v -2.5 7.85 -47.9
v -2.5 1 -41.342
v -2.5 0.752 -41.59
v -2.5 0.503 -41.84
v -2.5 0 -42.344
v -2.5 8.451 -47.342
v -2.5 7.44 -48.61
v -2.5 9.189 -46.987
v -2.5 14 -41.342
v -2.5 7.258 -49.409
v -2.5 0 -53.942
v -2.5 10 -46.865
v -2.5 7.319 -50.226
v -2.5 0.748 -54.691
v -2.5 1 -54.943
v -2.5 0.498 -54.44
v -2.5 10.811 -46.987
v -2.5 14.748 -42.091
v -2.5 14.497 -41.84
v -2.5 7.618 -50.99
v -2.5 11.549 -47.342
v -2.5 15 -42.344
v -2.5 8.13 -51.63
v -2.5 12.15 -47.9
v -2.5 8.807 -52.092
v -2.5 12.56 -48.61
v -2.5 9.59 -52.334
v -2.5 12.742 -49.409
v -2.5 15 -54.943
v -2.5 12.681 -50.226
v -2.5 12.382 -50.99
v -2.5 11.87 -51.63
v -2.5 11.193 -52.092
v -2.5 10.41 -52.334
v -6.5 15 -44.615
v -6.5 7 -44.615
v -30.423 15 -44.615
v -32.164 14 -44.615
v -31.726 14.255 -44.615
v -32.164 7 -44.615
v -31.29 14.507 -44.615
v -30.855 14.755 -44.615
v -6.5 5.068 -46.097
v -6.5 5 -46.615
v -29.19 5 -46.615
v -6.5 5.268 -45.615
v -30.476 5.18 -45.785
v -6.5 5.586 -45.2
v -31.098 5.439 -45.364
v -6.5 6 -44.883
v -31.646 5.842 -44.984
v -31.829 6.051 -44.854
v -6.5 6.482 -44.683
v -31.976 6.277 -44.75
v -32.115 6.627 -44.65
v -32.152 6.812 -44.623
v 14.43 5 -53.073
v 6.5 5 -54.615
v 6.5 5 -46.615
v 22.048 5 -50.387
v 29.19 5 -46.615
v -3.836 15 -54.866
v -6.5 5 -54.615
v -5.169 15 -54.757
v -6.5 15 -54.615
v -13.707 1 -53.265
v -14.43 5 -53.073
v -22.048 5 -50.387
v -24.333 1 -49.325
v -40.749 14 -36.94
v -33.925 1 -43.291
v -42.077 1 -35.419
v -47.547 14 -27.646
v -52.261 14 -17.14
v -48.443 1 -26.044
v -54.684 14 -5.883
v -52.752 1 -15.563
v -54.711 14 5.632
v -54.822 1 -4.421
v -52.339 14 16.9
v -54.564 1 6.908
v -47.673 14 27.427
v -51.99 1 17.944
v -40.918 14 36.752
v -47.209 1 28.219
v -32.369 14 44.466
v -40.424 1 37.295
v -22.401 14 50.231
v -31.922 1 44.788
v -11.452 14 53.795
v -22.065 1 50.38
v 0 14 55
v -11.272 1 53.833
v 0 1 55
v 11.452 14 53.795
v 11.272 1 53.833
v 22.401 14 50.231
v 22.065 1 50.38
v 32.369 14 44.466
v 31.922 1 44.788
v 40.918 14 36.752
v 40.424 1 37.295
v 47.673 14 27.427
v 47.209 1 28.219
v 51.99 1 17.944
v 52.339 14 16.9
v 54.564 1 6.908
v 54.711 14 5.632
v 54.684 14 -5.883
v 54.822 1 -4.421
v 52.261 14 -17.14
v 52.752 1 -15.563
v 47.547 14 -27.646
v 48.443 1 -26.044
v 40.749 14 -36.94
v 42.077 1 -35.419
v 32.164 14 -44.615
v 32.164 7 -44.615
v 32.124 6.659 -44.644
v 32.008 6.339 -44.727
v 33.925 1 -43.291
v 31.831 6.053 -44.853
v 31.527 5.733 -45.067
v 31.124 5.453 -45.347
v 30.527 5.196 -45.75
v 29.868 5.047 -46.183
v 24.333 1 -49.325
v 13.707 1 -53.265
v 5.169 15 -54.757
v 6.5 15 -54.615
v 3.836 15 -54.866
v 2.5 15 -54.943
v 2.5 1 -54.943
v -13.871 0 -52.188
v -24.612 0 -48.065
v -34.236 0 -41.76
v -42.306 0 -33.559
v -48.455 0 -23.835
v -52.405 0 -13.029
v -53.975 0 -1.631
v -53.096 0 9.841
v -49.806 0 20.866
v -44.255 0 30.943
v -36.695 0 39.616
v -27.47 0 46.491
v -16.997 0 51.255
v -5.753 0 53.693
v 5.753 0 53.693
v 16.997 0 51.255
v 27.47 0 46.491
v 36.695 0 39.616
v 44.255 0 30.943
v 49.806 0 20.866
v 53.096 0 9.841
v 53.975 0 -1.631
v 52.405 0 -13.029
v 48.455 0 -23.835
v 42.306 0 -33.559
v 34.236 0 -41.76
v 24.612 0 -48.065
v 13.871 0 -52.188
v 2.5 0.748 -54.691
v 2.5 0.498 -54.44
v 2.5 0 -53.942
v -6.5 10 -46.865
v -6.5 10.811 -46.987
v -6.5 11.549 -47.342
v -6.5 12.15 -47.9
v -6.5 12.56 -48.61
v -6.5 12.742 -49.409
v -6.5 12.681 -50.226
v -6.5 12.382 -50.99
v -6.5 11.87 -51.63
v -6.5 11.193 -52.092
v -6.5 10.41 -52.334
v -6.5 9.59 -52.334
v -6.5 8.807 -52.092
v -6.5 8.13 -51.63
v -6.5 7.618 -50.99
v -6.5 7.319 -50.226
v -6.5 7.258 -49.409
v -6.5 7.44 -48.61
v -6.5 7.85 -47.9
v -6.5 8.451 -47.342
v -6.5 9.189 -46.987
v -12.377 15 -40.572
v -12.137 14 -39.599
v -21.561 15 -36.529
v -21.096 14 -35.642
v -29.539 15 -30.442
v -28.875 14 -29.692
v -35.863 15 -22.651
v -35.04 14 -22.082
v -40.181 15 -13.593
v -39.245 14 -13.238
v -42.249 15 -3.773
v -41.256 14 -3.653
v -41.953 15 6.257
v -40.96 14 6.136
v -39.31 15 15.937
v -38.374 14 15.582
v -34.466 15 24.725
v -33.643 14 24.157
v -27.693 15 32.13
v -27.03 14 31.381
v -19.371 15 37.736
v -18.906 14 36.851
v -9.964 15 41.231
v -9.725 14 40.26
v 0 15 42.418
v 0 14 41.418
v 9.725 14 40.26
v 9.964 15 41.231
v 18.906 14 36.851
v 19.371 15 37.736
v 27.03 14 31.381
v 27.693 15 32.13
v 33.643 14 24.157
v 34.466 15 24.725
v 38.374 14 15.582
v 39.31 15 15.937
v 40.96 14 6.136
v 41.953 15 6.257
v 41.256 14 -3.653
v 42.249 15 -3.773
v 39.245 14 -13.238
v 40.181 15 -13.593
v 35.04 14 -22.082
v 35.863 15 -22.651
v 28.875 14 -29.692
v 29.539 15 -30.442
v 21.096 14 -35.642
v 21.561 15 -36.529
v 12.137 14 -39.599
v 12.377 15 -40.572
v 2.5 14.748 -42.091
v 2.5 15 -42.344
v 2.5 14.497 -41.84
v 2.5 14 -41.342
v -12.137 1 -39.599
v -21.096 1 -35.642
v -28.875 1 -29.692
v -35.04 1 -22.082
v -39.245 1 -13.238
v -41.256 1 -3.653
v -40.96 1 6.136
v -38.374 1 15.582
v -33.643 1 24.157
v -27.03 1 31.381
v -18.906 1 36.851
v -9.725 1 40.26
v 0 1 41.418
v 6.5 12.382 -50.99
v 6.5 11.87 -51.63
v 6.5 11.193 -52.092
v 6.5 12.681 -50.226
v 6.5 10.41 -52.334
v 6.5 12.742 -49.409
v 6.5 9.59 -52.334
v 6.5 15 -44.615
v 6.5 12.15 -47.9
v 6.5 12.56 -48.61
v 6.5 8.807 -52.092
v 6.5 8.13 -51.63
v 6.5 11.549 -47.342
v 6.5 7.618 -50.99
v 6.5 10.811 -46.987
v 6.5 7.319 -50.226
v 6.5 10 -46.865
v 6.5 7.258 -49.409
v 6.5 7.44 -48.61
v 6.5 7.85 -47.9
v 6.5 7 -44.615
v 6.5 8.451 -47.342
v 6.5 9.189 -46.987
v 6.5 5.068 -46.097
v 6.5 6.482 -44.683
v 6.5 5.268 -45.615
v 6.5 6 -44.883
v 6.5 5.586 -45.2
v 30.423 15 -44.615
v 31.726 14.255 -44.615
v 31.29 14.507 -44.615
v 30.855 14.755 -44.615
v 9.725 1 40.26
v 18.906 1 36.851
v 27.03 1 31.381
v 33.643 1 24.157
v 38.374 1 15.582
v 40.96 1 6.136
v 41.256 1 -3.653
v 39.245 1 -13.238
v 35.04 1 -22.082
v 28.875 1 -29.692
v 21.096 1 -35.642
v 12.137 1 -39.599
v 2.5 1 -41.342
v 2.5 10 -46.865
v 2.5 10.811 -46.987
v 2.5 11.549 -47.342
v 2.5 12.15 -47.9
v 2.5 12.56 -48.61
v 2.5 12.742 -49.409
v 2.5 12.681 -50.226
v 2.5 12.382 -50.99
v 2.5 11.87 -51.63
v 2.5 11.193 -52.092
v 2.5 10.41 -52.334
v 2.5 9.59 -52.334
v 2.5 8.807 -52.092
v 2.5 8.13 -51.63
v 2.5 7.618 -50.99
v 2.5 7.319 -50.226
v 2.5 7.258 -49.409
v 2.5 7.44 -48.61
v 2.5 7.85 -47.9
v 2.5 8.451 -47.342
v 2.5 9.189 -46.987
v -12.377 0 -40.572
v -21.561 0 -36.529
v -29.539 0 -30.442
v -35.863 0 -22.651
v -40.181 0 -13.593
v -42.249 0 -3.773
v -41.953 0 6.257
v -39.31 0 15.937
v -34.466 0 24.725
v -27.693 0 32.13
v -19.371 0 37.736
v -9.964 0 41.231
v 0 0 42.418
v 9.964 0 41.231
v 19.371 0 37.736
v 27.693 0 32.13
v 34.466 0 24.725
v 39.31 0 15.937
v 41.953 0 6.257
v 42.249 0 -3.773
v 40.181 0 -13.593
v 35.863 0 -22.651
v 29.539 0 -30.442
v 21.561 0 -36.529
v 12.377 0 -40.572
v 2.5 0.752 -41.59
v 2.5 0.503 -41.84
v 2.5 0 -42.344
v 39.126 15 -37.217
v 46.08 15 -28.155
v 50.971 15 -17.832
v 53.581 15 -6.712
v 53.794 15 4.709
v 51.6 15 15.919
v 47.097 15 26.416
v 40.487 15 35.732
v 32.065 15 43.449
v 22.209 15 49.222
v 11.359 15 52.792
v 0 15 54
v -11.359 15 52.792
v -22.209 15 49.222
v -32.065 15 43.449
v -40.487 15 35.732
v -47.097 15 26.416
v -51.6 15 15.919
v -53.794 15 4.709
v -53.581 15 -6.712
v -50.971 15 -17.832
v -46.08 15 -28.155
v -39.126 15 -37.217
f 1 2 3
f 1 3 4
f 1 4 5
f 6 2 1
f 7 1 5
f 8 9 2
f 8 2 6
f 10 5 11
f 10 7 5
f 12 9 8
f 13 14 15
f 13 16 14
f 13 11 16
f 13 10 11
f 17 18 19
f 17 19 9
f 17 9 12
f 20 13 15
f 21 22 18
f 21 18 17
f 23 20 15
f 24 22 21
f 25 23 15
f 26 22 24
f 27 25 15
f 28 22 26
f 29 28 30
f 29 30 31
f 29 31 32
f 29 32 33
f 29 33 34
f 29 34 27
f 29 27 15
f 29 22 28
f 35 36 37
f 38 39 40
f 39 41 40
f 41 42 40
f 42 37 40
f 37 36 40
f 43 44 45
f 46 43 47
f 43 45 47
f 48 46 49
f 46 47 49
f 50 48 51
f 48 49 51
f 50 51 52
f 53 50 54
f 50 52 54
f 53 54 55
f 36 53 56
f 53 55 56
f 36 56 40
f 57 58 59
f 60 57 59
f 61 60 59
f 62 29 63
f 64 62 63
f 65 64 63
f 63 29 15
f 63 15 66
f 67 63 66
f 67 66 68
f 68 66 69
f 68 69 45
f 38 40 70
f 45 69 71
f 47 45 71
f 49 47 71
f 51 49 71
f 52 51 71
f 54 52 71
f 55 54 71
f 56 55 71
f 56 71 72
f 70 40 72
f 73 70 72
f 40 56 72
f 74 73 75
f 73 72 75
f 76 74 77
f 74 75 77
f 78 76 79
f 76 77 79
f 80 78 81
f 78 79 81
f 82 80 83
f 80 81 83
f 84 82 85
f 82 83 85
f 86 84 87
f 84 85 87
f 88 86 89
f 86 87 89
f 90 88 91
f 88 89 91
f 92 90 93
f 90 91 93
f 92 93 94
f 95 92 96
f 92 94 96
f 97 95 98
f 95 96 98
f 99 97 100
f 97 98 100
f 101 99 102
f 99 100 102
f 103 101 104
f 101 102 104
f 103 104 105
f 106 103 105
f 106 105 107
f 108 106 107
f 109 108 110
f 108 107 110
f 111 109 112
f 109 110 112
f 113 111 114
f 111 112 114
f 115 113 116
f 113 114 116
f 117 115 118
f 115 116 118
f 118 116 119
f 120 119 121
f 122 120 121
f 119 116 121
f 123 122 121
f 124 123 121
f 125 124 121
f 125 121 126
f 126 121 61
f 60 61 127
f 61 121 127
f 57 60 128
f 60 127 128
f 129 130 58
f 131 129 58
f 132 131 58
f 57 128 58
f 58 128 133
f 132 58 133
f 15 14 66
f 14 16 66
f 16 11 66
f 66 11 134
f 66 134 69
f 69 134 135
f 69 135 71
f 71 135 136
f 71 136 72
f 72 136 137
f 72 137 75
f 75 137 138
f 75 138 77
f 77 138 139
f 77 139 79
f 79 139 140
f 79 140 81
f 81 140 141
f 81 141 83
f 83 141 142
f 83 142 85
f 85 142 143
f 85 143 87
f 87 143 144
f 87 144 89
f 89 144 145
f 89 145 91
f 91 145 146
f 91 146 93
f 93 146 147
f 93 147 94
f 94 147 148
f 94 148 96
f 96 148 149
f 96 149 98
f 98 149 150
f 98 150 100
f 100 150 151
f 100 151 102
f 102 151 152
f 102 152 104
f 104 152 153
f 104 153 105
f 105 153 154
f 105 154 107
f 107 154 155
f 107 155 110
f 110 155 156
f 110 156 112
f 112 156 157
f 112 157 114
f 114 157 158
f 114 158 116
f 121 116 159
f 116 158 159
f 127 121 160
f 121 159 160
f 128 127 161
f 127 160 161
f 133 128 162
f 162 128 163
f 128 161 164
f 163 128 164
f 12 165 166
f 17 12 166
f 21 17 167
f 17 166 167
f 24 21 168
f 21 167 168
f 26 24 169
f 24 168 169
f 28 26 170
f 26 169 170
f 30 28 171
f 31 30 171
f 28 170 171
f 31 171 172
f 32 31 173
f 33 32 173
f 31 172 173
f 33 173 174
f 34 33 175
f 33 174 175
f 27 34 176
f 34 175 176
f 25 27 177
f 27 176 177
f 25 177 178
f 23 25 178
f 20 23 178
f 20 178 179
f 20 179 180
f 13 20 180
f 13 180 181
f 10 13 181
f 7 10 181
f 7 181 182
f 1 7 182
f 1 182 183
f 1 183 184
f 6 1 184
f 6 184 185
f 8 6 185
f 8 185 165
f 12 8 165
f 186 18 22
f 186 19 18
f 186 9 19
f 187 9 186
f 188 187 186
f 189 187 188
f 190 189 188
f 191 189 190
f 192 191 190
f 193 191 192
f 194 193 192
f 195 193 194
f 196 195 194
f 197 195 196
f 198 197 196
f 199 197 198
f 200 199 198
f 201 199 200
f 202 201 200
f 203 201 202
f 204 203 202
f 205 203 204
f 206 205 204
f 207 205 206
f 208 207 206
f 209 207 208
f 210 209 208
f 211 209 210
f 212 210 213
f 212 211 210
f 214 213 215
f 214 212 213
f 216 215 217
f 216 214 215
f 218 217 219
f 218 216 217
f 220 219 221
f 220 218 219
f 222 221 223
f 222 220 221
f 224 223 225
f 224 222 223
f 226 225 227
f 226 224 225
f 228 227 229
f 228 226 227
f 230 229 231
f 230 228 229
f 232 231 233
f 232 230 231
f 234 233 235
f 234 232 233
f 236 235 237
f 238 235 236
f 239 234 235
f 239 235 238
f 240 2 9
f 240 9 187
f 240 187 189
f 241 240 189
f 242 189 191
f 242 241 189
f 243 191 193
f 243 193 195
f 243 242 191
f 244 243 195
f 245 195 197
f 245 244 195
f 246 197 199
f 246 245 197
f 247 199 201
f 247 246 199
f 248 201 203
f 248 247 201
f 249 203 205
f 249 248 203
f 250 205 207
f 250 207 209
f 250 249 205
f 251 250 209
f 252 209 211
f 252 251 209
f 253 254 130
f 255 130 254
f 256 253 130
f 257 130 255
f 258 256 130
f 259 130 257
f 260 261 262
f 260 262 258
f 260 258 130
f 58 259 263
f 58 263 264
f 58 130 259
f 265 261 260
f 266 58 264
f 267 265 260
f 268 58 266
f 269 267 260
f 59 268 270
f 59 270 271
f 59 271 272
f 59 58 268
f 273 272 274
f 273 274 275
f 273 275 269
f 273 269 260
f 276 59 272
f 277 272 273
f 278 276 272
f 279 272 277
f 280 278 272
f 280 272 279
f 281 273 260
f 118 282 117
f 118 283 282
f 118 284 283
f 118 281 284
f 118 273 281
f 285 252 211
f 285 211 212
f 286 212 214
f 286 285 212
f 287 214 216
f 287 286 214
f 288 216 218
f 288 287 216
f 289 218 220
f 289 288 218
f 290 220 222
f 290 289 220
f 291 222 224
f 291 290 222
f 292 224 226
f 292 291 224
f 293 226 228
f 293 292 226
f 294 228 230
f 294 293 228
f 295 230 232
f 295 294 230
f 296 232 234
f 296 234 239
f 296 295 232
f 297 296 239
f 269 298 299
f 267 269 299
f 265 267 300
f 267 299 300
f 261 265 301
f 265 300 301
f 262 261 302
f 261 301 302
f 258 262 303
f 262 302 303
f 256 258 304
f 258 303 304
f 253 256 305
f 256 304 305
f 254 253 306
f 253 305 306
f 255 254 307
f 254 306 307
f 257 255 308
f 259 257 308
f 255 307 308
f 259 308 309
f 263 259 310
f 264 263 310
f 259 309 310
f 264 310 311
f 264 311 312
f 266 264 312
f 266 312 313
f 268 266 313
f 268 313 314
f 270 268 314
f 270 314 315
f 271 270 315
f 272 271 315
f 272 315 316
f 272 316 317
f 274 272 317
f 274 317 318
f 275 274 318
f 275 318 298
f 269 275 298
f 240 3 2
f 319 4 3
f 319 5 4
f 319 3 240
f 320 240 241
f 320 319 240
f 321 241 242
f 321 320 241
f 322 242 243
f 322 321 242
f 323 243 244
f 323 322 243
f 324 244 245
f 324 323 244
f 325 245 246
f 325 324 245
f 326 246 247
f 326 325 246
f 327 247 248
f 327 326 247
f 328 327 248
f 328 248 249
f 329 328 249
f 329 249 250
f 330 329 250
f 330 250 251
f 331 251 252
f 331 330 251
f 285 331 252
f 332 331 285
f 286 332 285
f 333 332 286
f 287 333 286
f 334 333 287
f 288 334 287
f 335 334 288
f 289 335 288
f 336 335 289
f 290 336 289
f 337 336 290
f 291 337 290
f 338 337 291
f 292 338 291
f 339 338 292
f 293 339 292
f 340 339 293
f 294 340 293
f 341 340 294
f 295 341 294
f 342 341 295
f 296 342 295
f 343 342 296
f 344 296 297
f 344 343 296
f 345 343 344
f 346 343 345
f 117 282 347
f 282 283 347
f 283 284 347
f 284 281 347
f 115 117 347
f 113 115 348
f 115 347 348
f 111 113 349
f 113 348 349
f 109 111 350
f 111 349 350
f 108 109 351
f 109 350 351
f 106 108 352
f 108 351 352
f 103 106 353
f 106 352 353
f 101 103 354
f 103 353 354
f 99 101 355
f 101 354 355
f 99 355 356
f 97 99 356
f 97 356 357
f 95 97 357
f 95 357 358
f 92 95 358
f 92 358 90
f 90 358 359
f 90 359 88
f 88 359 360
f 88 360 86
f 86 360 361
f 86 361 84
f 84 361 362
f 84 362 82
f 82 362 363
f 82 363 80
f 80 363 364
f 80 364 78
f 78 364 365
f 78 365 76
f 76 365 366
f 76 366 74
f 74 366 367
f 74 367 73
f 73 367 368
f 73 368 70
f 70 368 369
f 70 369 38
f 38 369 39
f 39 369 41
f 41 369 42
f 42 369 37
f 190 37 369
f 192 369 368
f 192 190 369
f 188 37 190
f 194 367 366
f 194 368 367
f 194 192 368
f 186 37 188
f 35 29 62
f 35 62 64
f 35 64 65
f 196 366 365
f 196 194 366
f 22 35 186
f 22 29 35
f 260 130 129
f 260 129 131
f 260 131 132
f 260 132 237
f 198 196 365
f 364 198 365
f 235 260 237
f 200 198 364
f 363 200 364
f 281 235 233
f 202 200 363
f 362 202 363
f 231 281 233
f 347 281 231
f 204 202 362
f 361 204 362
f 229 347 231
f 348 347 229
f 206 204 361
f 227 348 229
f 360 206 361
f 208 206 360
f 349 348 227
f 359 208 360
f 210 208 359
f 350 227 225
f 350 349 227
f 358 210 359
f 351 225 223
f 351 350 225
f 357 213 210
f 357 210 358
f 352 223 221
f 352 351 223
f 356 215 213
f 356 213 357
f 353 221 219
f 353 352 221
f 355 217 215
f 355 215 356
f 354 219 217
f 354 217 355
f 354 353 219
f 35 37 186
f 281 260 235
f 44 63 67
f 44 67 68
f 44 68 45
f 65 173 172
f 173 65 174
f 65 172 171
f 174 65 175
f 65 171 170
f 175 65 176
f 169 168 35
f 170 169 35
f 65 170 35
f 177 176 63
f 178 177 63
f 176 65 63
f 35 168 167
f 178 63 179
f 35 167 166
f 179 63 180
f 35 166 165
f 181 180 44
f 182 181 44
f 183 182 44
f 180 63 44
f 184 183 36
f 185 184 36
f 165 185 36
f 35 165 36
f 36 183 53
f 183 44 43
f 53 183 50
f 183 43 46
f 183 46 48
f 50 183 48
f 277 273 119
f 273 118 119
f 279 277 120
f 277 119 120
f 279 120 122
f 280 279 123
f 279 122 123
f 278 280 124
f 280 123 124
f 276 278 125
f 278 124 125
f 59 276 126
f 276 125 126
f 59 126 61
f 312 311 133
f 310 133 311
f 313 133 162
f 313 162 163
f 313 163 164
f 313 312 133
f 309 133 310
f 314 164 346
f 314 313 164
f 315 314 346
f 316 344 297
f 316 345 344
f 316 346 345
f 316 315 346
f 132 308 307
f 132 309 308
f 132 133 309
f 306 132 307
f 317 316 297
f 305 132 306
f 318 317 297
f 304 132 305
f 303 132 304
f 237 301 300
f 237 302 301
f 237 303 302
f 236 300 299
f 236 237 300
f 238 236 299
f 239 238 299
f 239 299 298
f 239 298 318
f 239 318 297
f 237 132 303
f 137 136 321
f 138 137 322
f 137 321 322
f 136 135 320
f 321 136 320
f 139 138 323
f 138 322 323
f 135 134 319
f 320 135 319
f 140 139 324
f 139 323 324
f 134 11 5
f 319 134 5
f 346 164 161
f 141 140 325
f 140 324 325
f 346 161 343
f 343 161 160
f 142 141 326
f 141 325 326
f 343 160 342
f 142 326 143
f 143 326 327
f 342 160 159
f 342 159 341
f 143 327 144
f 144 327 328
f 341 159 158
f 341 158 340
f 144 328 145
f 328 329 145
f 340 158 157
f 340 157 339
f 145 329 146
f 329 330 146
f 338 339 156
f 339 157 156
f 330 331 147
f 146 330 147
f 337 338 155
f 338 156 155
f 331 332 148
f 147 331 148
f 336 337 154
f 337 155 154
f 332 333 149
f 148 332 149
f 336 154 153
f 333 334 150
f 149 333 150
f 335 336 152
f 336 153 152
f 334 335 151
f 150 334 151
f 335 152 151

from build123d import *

# Parameters (mm, degrees)
SKETCH1_R           = 55
SKETCH1_R_2         = 41.4175
BOSS_EXTRUDE1_DEPTH = 15
CUT_EXTRUDE1_DEPTH  = 80.214897589
CUT_EXTRUDE2_START  = -10
CUT_EXTRUDE2_DEPTH  = 10
SKETCH4_R           = 2.75
CUT_EXTRUDE3_DEPTH  = 84.858511792
FILLET2_R           = 2
CHAMFER2_SIZE       = 1
CHAMFER3_SIZE       = 1


with BuildPart() as part:
    # Sketch1 → Boss-Extrude1 (new body)
    with BuildSketch(Plane(origin=(0, 0, 0), x_dir=(1, 0, 0), z_dir=(0, 1, 0))):
        with Locations(Location((0, 0, 0), (0, 0, 270))):
            Circle(SKETCH1_R)
        with Locations(Location((0, 0, 0), (0, 0, 270))):
            Circle(SKETCH1_R_2, mode=Mode.SUBTRACT)
    extrude(amount=BOSS_EXTRUDE1_DEPTH)

    # Sketch2 → Cut-Extrude1 (cut, through all)
    with BuildSketch(Plane(origin=(0, 15, 0), x_dir=(1, 0, 0), z_dir=(0, 1, 0))):
        with BuildLine():
            Line((-2.5, 41.341979951), (-2.5, 54.94315244))
            ThreePointArc((-2.5, 54.94315244), (0, 55), (2.5, 54.94315244))
            Line((2.5, 54.94315244), (2.5, 41.341979951))
            ThreePointArc((2.5, 41.341979951), (0, 41.4175), (-2.5, 41.341979951))
        make_face()
    extrude(amount=-CUT_EXTRUDE1_DEPTH, mode=Mode.SUBTRACT)

    # Sketch3 → Cut-Extrude2 (cut)
    with BuildSketch(Plane(origin=(0, 15, 0), x_dir=(1, 0, 0), z_dir=(0, 1, 0)).offset(CUT_EXTRUDE2_START)):
        with BuildLine():
            Line((-6.5, 54.614558499), (-6.5, 44.614558499))
            Line((-6.5, 44.614558499), (-32.164284074, 44.614558499))
            ThreePointArc((-32.164284074, 44.614558499), (-19.96826772, 51.247129522), (-6.5, 54.614558499))
        make_face()
        with BuildLine():
            Line((6.5, 44.614558499), (32.164284074, 44.614558499))
            ThreePointArc((32.164284074, 44.614558499), (19.96826772, 51.247129522), (6.5, 54.614558499))
            Line((6.5, 54.614558499), (6.5, 44.614558499))
        make_face()
    extrude(amount=CUT_EXTRUDE2_DEPTH, mode=Mode.SUBTRACT)

    # Sketch4 → Cut-Extrude3 (cut, through all)
    with BuildSketch(Plane.ZY.offset(6.5)):
        with Locations((-49.614558499, 10)):
            Circle(SKETCH4_R)
    extrude(amount=-CUT_EXTRUDE3_DEPTH, mode=Mode.SUBTRACT)

    # Fillet2
    fillet2_edges = [part.edges().sort_by_distance(p)[0] for p in [
        (-19.332142037, 5, -44.614558499),
        (19.332142037, 5, -44.614558499),
    ]]
    fillet(fillet2_edges, radius=FILLET2_R)

    # Chamfer2
    chamfer2_edges = [part.edges().sort_by_distance(p)[0] for p in [
        (0, 0, 55),
        (0, 15, 55),
    ]]
    chamfer(chamfer2_edges, length=CHAMFER2_SIZE)

    # Chamfer3
    chamfer3_edges = [part.edges().sort_by_distance(p)[0] for p in [
        (-41.398615683, 0, 1.250570198),
        (41.398615683, 15, 1.250570198),
    ]]
    chamfer(chamfer3_edges, length=CHAMFER3_SIZE)


solid = part.part
